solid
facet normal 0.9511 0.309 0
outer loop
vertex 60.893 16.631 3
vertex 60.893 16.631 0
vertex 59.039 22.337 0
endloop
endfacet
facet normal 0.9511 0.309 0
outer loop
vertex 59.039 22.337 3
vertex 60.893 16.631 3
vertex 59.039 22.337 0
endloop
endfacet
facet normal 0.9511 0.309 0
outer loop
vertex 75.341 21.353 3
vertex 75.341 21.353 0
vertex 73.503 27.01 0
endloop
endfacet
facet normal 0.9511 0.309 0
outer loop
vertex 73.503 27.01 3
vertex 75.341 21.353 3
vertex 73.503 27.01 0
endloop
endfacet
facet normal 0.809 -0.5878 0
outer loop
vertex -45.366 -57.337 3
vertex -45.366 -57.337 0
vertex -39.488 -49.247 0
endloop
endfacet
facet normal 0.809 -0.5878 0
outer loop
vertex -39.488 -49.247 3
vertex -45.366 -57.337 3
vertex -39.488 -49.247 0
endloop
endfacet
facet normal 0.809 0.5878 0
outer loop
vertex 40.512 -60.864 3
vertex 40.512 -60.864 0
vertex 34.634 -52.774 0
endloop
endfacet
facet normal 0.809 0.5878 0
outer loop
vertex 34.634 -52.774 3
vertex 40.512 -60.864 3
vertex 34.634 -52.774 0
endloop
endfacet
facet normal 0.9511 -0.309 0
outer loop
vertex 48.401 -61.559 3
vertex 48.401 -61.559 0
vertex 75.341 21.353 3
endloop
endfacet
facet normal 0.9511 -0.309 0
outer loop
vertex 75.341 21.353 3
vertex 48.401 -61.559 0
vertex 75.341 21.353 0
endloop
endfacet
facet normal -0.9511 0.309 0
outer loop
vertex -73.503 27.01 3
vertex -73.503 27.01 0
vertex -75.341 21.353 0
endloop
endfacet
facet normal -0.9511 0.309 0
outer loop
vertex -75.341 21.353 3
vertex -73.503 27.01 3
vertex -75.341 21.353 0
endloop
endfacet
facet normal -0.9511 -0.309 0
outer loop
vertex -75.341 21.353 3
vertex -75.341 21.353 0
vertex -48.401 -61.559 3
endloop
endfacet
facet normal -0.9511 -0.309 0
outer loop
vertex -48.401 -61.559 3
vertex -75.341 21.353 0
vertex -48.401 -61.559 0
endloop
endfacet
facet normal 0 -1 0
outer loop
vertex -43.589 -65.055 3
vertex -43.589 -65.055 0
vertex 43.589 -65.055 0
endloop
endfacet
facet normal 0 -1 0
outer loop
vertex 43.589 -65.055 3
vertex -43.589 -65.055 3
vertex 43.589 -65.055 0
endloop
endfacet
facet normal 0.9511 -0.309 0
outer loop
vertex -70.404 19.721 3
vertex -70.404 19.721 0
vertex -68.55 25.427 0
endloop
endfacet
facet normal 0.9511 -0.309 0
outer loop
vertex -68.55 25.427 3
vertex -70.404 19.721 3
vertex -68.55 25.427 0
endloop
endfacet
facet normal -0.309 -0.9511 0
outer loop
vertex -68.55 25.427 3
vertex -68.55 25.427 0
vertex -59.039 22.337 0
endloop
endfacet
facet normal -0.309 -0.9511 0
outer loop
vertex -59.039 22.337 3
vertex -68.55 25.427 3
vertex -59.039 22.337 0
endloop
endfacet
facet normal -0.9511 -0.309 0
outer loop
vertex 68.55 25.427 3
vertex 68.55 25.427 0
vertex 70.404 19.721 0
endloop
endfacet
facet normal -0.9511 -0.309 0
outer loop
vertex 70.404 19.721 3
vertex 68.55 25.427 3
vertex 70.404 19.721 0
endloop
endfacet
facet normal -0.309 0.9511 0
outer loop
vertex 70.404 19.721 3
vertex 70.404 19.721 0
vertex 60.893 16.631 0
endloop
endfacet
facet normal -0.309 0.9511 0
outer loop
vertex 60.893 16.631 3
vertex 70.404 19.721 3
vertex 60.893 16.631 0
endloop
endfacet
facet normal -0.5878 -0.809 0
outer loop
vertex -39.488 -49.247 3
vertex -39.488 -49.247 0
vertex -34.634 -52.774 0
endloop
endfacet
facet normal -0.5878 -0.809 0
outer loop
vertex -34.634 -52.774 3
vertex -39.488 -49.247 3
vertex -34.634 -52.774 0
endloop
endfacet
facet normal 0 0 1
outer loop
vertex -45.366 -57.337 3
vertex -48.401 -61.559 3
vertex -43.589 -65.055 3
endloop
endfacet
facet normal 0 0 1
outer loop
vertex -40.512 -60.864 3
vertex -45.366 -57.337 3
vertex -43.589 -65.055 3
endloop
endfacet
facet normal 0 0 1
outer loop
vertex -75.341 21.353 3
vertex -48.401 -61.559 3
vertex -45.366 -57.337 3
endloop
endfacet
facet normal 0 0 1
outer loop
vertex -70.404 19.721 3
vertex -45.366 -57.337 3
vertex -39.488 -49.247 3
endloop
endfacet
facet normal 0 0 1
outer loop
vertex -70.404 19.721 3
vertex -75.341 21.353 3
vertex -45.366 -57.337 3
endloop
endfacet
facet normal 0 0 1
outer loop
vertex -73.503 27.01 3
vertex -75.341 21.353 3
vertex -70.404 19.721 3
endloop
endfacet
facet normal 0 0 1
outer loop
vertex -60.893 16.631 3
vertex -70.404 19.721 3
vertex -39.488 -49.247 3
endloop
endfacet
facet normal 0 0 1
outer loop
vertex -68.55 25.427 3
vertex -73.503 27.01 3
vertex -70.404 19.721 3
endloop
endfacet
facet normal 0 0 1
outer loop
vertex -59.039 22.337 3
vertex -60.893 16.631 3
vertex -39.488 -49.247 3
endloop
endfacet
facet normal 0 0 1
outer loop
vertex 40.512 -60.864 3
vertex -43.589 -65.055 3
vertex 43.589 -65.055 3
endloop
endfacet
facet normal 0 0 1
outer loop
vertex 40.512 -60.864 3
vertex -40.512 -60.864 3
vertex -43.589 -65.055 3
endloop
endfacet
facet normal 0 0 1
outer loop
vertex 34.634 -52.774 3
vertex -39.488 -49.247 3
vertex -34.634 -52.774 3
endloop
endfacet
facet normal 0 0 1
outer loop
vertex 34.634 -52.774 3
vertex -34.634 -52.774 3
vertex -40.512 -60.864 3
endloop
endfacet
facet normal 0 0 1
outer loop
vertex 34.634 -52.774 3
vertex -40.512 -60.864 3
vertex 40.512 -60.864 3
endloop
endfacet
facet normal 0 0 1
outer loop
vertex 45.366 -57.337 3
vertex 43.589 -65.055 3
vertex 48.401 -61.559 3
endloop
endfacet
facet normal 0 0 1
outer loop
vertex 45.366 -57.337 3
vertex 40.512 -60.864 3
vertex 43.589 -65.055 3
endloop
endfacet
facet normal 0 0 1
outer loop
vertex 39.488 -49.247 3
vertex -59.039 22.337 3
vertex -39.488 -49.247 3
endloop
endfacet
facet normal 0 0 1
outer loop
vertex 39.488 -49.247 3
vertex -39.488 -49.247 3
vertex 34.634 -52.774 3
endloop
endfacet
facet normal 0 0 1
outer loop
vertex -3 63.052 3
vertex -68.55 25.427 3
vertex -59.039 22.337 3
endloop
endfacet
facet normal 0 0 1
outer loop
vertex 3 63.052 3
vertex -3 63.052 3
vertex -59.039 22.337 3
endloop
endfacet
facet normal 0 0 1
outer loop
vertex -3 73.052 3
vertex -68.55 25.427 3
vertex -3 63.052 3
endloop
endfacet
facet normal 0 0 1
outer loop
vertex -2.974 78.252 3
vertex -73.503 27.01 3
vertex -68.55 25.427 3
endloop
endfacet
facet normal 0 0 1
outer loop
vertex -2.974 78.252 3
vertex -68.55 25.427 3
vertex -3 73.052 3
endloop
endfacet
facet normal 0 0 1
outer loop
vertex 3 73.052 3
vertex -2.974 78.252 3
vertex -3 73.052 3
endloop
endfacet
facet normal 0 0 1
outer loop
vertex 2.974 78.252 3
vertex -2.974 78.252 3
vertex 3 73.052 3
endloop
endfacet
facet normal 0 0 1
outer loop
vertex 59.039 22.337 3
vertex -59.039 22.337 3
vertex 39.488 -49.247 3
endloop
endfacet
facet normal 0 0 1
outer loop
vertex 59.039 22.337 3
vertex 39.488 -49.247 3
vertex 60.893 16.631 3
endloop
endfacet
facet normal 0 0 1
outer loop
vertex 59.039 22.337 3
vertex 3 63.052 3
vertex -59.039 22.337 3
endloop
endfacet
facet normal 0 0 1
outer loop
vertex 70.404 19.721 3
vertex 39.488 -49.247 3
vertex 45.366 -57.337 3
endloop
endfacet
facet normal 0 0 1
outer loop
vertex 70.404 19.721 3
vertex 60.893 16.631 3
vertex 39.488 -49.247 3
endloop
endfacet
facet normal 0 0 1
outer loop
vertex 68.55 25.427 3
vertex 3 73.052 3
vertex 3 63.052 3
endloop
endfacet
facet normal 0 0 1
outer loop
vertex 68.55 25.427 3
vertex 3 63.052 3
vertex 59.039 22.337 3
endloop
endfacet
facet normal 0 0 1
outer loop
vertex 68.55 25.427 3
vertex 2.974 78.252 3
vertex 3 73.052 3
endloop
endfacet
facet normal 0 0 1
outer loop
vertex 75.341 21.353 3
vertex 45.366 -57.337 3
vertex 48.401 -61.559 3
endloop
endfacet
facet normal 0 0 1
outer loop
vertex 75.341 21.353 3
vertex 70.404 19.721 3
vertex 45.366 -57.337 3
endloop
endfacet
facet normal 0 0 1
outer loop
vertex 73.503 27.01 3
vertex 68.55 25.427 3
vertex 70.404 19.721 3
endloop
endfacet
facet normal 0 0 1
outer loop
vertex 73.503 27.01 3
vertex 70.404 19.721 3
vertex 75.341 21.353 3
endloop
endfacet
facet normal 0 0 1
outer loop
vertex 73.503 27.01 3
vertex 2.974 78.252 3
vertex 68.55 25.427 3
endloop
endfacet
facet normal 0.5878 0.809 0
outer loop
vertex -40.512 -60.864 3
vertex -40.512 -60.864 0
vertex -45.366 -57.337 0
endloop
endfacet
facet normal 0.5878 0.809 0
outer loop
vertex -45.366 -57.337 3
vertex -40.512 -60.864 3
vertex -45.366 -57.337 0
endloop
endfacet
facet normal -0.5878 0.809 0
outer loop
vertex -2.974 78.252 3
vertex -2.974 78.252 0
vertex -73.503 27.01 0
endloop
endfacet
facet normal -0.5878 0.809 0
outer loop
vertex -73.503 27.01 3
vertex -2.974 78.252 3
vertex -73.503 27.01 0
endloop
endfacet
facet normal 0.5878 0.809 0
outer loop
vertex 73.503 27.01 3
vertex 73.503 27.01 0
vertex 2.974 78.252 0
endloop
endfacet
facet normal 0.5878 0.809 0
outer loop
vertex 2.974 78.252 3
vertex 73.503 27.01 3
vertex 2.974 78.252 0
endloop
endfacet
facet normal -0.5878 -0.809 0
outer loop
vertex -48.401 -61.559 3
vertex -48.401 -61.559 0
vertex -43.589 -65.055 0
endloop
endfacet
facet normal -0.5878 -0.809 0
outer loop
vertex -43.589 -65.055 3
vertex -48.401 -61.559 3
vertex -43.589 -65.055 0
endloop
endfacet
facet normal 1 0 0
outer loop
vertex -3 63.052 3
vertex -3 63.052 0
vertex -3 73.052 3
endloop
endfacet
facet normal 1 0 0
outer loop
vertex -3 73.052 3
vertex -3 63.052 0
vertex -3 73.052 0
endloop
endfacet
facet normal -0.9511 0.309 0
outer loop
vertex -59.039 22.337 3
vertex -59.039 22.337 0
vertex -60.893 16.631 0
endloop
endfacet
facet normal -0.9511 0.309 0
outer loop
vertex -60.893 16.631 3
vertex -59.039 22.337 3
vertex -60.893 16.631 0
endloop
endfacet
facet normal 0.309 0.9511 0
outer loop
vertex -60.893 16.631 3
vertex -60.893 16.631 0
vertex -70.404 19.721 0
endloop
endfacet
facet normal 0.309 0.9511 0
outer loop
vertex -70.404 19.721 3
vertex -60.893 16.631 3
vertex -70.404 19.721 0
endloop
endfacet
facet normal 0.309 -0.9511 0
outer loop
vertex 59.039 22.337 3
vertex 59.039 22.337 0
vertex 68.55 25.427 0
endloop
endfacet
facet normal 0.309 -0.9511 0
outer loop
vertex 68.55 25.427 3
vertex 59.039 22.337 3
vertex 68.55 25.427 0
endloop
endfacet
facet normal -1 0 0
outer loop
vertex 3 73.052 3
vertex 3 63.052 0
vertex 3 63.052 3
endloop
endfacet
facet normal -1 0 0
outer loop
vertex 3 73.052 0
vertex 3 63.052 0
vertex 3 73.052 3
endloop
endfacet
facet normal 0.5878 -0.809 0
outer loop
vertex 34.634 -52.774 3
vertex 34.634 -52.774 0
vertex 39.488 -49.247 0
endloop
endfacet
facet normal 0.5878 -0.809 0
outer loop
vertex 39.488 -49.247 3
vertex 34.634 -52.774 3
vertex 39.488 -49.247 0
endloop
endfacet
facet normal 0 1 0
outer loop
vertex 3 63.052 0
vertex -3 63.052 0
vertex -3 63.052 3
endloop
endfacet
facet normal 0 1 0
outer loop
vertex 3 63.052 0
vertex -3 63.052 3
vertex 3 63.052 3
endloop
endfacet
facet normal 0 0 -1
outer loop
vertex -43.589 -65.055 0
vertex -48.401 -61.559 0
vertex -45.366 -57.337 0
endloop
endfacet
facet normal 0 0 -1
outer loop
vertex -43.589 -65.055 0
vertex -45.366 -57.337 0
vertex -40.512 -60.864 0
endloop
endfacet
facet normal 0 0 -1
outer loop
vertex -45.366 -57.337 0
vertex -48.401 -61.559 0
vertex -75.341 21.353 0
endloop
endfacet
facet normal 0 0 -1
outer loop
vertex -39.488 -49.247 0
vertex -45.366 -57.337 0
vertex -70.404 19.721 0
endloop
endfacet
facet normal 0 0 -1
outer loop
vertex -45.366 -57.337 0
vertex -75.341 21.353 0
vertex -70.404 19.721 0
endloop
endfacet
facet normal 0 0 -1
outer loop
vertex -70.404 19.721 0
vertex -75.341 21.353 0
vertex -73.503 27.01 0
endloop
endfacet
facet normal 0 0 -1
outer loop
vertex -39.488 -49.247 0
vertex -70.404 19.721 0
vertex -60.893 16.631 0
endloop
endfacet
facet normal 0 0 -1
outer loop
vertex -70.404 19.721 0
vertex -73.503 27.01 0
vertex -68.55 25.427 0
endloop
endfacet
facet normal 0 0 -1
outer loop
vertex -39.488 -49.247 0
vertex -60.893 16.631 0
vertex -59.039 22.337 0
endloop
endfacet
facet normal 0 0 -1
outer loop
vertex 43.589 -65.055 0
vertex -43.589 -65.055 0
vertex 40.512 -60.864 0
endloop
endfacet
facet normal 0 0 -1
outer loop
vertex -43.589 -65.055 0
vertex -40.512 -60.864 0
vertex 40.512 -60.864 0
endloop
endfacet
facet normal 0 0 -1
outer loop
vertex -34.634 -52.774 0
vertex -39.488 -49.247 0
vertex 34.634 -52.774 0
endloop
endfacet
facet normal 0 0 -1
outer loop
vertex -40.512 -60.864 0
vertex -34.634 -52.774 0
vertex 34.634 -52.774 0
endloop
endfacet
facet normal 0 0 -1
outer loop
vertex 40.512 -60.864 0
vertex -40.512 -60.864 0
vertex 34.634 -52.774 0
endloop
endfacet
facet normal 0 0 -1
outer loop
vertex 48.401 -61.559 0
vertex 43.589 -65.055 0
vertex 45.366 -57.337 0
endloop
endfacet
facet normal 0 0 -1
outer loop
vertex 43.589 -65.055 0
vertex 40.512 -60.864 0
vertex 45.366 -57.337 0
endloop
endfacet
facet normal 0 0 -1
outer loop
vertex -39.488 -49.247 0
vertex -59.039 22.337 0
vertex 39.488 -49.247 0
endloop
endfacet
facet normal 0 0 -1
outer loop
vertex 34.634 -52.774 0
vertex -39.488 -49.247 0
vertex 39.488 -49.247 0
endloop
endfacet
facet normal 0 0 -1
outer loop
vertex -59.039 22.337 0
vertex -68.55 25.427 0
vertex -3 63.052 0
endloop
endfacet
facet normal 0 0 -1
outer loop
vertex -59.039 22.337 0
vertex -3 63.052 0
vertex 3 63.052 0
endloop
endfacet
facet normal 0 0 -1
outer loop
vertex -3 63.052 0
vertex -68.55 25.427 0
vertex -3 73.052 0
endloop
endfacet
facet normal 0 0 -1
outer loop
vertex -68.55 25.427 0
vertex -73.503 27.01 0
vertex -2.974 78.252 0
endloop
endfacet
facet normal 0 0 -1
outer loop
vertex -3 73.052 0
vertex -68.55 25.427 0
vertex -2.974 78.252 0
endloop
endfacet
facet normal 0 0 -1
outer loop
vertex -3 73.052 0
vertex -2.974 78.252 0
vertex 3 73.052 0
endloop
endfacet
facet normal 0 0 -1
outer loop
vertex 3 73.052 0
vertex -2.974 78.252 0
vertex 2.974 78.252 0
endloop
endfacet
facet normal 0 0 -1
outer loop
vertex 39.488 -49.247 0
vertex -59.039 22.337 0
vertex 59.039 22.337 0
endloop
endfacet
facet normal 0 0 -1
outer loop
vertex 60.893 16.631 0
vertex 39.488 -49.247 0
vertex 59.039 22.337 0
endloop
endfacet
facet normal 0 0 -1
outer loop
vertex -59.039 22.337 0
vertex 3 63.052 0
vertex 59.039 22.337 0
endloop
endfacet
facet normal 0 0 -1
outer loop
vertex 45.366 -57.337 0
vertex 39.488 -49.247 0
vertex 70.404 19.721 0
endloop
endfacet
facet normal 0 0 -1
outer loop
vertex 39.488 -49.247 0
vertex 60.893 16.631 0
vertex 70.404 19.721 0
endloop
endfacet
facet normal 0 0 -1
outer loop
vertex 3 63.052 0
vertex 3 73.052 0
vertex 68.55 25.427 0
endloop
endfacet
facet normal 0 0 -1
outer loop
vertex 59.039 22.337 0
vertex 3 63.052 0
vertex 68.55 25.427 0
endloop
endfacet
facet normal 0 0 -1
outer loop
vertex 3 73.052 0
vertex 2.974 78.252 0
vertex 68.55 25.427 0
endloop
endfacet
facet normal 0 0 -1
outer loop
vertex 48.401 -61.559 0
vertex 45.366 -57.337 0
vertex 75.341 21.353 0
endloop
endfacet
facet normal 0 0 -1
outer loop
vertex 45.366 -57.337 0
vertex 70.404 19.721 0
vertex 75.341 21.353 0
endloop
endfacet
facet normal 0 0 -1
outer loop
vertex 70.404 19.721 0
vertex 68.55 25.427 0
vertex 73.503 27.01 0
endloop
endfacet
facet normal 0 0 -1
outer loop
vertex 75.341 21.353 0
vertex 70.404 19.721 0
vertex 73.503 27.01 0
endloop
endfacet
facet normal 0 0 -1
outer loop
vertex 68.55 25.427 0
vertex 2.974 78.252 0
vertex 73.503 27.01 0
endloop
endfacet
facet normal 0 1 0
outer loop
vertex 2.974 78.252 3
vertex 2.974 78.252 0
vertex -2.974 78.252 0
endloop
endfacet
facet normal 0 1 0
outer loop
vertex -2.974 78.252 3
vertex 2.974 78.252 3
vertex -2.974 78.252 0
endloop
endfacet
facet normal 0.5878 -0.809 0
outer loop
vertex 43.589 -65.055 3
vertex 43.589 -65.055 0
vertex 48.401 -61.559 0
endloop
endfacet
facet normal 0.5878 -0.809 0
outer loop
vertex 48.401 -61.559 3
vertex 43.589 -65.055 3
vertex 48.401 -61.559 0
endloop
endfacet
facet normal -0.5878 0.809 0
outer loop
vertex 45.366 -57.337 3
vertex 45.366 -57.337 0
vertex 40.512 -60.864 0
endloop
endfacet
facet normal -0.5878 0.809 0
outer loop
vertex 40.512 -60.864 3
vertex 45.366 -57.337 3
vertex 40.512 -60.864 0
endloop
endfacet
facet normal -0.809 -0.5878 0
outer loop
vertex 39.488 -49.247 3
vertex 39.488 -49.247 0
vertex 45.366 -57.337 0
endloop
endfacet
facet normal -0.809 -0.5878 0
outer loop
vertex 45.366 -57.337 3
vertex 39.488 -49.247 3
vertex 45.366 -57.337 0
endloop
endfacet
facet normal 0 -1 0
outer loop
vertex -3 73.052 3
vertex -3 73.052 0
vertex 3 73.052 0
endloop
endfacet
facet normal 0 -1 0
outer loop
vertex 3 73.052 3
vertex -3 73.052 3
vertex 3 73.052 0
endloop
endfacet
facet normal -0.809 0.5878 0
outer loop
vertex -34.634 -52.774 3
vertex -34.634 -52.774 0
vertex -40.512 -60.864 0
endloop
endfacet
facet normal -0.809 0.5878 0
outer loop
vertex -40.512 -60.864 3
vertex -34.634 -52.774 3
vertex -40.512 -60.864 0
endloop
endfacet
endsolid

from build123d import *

# Parameters (mm, degrees)
F0_W     = 6
F0_H     = 10
F1_DEPTH = 3


with BuildPart() as f1:
    # F0 (on Top) → F1 (new body)
    with BuildSketch(Plane.XY):
        Polygon((48.401362, -61.559224), (75.341128, 21.352851), (73.503144, 27.009584), (2.973921, 78.252065), (-2.973921, 78.252065), (-73.503144, 27.009584), (-75.341128, 21.352851), (-48.401362, -61.559224), (-43.589457, -65.055277), (43.589457, -65.055277), align=None)
        Polygon((-45.365977, -57.337006), (-39.488125, -49.246836), (-34.634023, -52.773548), (-40.511875, -60.863718), align=None, mode=Mode.SUBTRACT)
        Polygon((40.511875, -60.863718), (34.634023, -52.773548), (39.488125, -49.246836), (45.365977, -57.337006), align=None, mode=Mode.SUBTRACT)
        Polygon((-68.549591, 25.427499), (-59.039026, 22.337329), (-60.893128, 16.63099), (-70.403693, 19.72116), align=None, mode=Mode.SUBTRACT)
        Polygon((70.403693, 19.72116), (60.893128, 16.63099), (59.039026, 22.337329), (68.549591, 25.427499), align=None, mode=Mode.SUBTRACT)
        with Locations((0, 68.052065)):
            Rectangle(F0_W, F0_H, mode=Mode.SUBTRACT)
    extrude(amount=F1_DEPTH)


solid = f1.part
